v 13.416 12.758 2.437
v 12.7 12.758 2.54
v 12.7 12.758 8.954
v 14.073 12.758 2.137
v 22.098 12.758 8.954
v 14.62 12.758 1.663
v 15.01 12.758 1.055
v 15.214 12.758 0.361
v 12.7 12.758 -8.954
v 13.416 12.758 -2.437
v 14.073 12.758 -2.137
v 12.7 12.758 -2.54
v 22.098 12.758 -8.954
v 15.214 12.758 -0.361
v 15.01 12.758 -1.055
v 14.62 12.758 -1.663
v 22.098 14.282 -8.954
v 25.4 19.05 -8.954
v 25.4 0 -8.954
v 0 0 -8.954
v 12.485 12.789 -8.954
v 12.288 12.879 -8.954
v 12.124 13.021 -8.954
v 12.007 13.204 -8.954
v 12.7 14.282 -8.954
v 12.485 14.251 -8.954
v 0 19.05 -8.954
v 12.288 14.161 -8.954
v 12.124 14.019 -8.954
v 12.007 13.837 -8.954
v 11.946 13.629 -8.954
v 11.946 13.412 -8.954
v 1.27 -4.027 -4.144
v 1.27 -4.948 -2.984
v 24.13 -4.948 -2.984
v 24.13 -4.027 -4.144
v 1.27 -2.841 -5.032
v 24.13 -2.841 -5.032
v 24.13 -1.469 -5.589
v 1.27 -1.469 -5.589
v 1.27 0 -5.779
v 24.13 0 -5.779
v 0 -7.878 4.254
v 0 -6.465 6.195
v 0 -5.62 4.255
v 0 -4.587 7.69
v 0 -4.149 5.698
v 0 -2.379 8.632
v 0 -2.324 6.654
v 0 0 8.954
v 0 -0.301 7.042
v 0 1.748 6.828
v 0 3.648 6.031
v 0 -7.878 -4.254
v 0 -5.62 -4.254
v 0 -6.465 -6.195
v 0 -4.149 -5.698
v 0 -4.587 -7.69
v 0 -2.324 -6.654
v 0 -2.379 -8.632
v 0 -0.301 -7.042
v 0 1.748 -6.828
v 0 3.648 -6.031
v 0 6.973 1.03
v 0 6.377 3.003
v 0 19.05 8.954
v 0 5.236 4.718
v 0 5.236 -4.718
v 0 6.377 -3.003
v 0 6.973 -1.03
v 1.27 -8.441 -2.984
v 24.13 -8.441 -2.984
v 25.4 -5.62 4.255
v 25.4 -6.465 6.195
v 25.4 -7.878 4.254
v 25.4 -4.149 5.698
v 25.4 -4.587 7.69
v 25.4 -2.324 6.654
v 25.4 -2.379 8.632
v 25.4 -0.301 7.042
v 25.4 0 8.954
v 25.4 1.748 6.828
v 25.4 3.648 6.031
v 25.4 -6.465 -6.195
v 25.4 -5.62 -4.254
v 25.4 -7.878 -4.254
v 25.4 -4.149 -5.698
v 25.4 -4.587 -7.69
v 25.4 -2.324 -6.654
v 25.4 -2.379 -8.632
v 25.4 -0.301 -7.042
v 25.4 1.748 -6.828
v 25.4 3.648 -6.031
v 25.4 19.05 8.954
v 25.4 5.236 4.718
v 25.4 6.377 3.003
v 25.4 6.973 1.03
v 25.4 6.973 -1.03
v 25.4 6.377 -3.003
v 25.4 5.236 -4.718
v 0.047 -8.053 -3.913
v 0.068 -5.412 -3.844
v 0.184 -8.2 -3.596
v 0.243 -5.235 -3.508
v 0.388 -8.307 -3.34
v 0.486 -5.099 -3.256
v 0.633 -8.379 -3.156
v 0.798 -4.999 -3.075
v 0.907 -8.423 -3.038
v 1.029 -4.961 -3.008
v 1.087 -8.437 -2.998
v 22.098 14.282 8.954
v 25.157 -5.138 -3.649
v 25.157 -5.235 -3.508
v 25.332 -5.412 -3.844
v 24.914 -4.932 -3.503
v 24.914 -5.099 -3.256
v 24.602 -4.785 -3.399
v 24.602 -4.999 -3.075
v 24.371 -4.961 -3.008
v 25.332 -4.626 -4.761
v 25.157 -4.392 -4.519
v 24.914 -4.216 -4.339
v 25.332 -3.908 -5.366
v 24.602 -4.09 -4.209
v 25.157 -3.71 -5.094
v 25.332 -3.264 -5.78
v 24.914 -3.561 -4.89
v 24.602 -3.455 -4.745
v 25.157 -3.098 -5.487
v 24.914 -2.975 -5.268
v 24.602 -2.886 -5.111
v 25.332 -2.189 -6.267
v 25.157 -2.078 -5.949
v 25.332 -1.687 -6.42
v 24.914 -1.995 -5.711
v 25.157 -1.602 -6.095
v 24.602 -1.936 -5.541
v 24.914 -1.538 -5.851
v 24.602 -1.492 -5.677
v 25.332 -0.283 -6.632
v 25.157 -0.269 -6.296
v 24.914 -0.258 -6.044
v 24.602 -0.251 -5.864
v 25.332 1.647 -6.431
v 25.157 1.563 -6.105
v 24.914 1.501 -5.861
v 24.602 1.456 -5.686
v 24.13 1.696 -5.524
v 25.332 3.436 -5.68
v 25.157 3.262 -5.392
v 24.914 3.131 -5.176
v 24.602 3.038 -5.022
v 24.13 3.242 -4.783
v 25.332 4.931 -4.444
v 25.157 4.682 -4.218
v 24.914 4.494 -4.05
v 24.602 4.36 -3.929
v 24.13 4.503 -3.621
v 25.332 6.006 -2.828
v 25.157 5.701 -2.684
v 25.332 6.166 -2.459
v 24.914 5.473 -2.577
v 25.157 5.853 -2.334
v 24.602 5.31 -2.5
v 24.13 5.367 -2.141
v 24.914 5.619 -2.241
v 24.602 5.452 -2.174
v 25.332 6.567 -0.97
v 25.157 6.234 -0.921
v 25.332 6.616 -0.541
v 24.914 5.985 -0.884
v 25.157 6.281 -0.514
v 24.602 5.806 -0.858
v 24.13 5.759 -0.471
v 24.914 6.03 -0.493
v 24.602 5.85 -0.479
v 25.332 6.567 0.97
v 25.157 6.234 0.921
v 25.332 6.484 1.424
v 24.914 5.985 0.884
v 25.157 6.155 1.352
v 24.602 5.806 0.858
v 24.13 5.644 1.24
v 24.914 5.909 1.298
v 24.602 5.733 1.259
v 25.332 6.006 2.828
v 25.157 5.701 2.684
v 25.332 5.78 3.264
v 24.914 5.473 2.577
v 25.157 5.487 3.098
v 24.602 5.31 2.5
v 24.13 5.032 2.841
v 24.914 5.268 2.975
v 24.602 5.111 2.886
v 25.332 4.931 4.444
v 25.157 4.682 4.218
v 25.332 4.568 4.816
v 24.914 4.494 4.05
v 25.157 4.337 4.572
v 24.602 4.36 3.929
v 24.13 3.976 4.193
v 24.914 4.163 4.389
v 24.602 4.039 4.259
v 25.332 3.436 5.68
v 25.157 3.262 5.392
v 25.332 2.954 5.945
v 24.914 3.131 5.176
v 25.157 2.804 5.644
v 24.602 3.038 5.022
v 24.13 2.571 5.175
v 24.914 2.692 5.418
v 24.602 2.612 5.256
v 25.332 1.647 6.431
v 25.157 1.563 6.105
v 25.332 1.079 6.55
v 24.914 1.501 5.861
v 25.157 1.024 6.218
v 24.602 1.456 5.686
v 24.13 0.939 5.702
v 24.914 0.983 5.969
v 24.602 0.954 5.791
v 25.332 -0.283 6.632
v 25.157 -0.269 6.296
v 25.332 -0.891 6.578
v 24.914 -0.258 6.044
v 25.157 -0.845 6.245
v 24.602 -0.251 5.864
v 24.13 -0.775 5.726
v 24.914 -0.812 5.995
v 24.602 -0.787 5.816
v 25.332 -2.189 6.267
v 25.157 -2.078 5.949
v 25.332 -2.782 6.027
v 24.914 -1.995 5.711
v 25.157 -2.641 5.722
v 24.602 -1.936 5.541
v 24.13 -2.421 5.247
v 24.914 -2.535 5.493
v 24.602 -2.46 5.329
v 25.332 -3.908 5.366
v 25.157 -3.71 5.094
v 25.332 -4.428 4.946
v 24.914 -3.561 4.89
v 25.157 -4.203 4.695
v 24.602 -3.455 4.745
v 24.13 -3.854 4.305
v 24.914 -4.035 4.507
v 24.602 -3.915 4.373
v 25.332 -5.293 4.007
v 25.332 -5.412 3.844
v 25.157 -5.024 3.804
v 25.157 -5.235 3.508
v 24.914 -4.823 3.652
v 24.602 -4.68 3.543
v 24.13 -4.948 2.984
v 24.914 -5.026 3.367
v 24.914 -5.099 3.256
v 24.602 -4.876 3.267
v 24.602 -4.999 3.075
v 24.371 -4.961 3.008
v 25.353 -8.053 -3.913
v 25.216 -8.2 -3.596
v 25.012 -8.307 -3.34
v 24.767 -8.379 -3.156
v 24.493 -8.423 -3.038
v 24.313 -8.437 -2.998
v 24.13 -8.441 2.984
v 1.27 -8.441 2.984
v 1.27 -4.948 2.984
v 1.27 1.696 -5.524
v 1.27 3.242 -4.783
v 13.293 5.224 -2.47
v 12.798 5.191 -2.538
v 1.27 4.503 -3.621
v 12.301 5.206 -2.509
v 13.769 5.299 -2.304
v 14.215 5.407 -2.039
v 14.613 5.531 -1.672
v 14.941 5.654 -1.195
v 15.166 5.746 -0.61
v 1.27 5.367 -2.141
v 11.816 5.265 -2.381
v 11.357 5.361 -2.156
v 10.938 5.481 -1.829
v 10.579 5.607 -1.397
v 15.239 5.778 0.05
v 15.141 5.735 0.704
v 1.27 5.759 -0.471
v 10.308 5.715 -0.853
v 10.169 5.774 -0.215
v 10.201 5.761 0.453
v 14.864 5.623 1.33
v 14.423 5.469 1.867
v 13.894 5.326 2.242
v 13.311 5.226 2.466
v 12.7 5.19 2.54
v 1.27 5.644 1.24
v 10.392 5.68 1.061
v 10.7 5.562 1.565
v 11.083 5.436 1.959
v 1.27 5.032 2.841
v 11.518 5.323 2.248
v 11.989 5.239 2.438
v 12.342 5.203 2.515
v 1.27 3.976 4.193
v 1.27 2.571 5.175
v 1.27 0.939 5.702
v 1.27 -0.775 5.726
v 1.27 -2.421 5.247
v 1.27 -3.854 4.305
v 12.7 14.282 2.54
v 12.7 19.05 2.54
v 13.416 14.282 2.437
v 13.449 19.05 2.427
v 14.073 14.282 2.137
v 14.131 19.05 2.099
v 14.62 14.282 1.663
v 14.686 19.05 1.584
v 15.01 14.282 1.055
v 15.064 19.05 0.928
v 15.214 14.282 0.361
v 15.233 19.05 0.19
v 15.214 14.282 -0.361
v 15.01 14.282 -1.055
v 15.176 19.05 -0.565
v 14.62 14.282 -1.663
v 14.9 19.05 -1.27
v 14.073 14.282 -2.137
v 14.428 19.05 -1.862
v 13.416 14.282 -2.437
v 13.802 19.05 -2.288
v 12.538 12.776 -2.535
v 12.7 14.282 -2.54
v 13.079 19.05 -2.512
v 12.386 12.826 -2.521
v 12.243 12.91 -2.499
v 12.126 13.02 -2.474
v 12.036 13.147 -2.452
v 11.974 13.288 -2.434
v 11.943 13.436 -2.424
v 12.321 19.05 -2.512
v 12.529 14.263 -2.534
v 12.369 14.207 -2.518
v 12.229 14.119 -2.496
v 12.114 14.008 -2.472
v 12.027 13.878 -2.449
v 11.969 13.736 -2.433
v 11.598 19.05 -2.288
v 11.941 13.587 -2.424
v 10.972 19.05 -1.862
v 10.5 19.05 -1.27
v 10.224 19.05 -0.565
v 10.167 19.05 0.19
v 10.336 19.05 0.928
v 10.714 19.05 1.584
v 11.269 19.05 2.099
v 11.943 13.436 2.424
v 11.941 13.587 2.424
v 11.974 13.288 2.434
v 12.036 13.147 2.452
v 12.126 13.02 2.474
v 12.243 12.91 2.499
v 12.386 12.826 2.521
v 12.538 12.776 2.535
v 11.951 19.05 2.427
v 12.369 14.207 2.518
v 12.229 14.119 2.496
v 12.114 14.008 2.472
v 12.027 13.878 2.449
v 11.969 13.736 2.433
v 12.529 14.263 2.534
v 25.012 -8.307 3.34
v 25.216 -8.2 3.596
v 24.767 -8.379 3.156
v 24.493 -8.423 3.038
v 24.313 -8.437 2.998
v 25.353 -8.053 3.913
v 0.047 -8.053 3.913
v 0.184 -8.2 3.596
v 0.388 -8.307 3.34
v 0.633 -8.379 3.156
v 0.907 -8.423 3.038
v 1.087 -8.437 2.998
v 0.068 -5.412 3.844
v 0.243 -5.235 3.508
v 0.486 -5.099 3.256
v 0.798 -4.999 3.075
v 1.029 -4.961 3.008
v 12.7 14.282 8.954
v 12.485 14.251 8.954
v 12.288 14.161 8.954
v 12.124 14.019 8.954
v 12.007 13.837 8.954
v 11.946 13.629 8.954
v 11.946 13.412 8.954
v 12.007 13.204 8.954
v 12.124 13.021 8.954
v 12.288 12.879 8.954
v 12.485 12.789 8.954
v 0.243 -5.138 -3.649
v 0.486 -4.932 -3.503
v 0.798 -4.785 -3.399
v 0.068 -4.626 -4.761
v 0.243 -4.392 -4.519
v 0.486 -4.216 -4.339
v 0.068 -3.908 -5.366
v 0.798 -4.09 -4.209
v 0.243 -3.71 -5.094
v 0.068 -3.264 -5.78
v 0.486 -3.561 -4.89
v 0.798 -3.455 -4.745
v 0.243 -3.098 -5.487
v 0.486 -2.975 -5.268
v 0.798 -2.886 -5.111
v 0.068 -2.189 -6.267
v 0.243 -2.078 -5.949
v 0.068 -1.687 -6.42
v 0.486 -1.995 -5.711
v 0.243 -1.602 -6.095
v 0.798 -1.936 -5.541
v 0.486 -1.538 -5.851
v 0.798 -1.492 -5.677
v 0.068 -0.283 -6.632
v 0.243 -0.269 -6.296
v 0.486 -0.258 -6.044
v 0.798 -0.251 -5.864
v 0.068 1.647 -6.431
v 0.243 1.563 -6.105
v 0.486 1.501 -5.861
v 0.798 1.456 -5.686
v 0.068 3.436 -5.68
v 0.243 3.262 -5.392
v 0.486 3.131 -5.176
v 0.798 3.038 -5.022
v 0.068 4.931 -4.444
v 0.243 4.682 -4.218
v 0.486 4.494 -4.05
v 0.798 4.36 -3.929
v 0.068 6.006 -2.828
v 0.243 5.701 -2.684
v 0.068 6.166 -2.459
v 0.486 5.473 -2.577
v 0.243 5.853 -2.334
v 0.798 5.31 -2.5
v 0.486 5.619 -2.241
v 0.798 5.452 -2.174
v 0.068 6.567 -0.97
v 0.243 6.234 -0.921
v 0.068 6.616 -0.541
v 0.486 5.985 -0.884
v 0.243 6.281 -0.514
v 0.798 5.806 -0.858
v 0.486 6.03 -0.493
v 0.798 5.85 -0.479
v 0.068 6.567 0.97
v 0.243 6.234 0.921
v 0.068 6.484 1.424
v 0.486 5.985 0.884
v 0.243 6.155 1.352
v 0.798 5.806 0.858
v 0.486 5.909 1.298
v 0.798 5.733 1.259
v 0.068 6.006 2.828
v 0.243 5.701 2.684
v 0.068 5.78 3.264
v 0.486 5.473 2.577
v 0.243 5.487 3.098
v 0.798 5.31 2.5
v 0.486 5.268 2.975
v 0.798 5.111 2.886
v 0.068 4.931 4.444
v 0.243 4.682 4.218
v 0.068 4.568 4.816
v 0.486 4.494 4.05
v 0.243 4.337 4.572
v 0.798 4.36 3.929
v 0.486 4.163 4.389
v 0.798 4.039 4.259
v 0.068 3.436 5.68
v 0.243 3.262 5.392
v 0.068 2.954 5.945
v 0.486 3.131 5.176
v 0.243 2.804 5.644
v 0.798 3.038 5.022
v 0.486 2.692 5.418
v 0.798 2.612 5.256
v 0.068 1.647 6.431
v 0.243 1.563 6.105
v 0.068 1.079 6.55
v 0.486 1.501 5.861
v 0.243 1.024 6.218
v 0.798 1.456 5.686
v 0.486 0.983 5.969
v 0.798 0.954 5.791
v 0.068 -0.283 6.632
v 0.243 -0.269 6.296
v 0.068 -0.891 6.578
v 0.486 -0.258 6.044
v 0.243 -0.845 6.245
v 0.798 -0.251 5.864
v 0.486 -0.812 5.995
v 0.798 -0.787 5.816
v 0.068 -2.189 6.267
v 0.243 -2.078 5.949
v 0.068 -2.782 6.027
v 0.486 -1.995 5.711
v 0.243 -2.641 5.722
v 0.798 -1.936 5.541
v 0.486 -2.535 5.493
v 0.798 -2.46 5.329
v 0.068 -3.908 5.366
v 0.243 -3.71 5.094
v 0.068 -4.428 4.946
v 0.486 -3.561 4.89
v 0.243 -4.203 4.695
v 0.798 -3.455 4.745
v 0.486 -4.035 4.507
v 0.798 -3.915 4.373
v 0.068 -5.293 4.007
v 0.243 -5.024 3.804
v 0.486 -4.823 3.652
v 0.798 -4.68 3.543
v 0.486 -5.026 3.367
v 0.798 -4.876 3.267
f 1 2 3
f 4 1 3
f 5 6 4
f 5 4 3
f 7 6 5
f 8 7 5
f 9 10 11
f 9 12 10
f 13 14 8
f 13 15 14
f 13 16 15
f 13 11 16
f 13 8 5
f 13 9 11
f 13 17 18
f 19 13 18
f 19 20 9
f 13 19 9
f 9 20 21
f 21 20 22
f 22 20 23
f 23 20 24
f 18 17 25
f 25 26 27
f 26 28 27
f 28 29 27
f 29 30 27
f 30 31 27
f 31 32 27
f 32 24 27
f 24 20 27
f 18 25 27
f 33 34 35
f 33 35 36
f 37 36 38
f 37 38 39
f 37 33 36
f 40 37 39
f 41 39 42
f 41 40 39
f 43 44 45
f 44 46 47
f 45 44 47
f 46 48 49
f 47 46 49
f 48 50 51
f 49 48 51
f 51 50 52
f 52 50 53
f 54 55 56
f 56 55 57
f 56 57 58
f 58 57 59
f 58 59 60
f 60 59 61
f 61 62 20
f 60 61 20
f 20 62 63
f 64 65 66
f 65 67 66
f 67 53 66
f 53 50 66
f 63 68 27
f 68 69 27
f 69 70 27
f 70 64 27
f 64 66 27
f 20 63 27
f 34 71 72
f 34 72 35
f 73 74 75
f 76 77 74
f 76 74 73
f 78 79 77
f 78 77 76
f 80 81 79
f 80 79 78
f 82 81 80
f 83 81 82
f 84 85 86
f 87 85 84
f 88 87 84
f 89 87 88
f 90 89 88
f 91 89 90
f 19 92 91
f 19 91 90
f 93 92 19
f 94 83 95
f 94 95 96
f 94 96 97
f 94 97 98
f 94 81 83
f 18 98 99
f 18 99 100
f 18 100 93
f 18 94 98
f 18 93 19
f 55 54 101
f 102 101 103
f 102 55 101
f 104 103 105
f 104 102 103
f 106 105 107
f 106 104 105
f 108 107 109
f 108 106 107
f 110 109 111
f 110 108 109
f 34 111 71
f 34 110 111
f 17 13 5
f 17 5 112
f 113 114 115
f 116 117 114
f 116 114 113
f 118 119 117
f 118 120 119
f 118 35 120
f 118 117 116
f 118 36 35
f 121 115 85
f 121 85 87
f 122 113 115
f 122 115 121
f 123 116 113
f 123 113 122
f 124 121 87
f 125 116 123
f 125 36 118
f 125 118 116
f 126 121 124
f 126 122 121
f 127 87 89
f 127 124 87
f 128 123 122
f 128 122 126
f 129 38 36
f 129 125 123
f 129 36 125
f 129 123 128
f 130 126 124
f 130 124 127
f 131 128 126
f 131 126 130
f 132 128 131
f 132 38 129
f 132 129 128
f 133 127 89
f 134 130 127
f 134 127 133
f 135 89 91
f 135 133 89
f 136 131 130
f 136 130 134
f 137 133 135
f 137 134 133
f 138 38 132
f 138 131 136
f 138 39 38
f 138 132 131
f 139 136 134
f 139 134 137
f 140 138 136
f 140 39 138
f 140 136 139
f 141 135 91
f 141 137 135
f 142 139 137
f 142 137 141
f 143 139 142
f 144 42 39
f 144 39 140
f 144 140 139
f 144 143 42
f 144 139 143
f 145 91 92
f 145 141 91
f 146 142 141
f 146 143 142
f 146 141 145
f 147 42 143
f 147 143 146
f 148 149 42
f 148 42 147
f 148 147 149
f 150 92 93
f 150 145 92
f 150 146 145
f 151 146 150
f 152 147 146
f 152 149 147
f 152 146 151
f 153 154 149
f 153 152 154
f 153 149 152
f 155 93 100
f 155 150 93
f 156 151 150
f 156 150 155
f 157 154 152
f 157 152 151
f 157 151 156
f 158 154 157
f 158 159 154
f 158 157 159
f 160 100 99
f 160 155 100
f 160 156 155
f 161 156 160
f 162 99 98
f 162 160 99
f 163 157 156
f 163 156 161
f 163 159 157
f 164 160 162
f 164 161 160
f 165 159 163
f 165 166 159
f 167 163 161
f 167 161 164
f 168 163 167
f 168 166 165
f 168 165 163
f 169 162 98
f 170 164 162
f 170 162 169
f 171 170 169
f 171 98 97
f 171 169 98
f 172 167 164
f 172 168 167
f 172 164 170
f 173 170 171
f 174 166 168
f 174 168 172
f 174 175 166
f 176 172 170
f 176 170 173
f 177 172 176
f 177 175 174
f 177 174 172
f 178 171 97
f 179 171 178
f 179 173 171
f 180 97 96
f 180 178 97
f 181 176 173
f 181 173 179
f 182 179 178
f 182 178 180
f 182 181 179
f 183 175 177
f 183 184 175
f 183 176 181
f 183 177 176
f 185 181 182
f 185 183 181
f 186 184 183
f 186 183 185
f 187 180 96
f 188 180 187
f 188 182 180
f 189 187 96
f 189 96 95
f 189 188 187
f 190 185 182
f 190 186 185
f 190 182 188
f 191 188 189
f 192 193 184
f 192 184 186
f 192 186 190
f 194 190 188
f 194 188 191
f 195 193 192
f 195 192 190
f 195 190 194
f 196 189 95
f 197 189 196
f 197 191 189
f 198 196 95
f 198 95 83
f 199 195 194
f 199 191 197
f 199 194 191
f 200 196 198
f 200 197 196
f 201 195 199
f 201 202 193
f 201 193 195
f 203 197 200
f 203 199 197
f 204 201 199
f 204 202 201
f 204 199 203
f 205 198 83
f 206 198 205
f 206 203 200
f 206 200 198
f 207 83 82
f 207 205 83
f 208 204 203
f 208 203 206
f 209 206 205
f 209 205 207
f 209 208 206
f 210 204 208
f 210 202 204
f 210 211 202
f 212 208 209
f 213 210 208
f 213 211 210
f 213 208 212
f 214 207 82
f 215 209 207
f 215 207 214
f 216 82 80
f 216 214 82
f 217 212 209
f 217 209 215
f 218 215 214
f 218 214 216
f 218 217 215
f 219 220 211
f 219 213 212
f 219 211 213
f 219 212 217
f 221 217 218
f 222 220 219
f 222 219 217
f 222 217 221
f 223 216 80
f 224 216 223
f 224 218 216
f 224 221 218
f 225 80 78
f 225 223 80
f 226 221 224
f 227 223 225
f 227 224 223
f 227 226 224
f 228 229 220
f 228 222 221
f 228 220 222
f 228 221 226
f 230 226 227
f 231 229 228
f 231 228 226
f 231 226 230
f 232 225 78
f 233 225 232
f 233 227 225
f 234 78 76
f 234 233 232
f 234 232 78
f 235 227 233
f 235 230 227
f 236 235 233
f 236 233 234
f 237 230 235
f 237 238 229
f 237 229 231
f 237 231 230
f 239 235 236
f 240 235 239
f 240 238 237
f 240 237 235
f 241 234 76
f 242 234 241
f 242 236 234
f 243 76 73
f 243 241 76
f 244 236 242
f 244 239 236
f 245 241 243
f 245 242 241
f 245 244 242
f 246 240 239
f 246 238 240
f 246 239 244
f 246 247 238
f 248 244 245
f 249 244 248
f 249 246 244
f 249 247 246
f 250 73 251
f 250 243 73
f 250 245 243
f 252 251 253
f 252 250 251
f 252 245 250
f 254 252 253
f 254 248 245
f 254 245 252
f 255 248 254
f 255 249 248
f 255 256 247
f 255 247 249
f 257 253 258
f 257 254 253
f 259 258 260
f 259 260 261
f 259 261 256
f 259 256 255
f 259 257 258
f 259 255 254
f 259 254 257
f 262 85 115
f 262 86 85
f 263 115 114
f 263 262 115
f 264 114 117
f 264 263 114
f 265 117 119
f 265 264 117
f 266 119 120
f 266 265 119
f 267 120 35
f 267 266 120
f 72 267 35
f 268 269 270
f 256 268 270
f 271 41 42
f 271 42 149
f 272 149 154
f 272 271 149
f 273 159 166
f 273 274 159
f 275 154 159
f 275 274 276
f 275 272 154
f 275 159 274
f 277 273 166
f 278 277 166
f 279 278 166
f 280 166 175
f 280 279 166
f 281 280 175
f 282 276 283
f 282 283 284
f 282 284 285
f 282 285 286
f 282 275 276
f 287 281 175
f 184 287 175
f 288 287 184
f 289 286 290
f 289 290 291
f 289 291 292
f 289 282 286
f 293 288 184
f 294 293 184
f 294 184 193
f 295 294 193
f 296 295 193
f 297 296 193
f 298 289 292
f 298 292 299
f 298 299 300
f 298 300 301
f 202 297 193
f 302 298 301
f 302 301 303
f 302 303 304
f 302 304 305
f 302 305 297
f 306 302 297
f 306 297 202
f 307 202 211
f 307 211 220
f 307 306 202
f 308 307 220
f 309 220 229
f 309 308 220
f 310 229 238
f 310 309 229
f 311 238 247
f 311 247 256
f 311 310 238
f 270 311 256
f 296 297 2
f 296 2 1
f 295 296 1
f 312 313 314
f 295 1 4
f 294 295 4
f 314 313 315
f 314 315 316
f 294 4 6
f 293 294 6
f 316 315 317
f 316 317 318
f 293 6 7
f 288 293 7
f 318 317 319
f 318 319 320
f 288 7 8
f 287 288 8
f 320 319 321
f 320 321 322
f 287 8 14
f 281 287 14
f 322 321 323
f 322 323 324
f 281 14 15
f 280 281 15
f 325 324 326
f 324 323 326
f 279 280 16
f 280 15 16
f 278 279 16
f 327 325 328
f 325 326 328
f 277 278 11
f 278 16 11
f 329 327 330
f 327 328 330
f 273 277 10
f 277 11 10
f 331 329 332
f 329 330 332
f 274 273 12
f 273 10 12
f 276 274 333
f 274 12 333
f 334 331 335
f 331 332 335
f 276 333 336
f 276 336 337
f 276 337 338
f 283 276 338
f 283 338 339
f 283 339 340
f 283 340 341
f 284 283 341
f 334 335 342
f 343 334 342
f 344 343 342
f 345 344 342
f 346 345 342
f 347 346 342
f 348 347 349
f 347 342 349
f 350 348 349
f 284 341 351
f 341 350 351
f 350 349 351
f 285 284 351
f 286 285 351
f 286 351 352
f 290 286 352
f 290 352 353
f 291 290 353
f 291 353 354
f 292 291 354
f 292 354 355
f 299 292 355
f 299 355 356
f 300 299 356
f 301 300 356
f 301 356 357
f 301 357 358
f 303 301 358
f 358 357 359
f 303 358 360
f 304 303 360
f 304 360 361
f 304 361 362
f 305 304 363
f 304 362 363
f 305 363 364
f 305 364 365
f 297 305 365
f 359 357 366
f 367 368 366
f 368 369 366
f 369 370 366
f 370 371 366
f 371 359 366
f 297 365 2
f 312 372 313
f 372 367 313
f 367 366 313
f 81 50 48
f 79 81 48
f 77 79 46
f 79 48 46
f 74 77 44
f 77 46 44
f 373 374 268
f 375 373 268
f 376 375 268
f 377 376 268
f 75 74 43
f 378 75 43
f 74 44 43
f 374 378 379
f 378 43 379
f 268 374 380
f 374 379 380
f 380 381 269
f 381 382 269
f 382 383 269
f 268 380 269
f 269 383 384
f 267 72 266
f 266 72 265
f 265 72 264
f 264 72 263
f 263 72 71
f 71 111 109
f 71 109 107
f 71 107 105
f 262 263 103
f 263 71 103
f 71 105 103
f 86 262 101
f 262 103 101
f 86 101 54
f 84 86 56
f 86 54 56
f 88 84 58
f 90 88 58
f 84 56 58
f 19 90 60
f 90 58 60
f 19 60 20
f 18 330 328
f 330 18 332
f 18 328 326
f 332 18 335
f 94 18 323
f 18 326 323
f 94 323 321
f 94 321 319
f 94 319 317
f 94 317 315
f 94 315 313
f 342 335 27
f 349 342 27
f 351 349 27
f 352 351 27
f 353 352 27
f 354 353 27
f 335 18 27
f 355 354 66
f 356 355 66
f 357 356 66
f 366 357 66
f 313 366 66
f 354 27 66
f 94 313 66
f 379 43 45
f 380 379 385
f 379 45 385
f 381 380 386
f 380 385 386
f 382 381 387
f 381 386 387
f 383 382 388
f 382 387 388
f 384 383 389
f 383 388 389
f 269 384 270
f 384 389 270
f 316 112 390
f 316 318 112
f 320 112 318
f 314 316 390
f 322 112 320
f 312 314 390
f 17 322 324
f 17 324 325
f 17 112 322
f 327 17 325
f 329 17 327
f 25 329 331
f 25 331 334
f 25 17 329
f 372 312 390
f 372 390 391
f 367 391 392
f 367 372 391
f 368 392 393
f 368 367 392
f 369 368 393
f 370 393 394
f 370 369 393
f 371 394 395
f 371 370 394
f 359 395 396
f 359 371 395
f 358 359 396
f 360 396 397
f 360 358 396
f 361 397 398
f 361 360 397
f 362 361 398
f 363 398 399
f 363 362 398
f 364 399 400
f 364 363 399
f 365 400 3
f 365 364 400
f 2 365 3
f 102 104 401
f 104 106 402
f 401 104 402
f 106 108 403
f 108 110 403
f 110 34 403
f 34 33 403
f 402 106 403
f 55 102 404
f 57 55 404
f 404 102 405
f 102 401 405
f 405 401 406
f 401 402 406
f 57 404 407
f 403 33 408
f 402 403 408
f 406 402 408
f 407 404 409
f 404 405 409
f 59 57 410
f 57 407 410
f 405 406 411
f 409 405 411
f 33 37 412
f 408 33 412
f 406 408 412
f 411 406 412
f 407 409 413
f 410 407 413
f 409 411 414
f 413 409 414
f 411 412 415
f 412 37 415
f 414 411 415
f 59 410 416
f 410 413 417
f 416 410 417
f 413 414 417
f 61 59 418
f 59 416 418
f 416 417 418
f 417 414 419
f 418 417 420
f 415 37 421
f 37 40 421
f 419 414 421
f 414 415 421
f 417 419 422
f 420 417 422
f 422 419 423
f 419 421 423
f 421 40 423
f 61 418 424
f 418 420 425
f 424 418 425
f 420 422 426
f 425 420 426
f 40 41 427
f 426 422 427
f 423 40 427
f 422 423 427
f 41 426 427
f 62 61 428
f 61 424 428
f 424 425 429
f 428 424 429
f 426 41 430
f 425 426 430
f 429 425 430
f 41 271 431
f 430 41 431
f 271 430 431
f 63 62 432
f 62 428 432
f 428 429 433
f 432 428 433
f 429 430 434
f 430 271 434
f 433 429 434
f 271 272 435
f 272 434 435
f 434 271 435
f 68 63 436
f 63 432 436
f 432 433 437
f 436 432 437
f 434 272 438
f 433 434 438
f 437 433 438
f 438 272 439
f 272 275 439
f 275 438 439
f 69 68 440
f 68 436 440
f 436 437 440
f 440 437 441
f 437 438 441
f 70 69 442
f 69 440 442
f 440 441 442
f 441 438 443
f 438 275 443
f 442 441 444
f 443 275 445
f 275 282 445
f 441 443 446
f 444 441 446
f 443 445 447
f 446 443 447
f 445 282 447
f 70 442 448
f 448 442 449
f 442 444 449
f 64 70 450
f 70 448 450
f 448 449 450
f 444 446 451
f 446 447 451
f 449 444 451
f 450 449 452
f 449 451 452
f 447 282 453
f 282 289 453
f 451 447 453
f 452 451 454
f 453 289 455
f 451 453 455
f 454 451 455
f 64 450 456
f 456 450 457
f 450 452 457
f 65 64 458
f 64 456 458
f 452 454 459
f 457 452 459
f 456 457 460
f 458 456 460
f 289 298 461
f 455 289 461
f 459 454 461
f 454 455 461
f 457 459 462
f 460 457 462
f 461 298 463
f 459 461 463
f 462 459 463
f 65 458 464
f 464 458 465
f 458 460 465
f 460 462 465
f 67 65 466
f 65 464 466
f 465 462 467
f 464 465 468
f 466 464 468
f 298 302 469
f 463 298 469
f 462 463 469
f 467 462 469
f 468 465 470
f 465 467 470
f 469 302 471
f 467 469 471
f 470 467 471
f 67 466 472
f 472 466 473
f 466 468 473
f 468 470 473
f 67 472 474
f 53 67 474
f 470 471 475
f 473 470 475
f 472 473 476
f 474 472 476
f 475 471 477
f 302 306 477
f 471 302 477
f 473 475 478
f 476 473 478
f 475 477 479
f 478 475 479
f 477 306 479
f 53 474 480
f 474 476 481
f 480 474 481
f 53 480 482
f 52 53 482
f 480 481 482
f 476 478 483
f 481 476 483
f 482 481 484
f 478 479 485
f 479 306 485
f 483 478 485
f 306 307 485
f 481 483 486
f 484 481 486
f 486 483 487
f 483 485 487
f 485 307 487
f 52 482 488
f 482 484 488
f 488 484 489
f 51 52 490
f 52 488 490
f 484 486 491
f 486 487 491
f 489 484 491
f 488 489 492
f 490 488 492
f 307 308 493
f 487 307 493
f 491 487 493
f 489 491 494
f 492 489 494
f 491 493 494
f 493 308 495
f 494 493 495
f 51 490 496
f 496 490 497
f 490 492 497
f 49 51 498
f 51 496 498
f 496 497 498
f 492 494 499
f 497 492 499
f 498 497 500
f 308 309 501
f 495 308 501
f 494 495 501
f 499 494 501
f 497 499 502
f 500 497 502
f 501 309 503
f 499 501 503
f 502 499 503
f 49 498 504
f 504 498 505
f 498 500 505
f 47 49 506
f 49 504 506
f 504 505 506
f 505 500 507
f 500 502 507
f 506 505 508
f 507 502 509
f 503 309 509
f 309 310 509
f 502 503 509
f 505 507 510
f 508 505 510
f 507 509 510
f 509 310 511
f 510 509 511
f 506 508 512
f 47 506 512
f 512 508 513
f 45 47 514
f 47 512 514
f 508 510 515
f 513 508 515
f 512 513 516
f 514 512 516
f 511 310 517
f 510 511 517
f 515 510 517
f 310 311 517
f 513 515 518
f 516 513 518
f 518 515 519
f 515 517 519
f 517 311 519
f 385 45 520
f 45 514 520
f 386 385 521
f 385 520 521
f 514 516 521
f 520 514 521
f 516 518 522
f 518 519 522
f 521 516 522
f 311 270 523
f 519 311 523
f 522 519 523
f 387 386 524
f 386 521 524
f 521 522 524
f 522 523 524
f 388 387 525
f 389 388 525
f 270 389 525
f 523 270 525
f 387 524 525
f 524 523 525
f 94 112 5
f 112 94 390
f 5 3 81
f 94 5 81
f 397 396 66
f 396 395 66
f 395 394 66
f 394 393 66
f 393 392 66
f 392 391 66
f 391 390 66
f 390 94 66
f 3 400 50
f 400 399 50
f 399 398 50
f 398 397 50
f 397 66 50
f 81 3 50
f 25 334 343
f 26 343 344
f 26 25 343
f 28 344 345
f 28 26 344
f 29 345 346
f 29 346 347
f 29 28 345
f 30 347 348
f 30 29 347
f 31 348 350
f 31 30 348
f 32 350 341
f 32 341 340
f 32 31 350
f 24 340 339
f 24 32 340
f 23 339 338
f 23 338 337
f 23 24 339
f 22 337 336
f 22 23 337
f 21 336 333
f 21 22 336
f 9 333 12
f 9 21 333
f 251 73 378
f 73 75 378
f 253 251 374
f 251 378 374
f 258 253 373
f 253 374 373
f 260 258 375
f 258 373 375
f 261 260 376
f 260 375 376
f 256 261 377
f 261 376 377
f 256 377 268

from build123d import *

# Parameters (mm, degrees)
SKETCH1_R           = 5.7785
BOSS_EXTRUDE1_DEPTH = 25.4
CUT_EXTRUDE1_REACH  = 40.853
SKETCH2_R           = 2.54
SKETCH3_W           = 5.969
SKETCH3_H           = 4.005387026
CUT_EXTRUDE2_DEPTH  = 33.988295999
FILLET1_R           = 1.27
CUT_EXTRUDE4_DEPTH  = 31.887708266


with BuildPart() as part:
    # Sketch1 → Boss-Extrude1 (new body)
    with BuildSketch(Plane(origin=(0, 0, 0), x_dir=(0, 0, -1), z_dir=(1, 0, 0))):
        with BuildLine():
            Line((-8.9535, 19.05), (-8.9535, 0))
            ThreePointArc((-8.9535, 0), (0, -8.9535), (8.9535, 0))
            Line((8.9535, 0), (8.9535, 19.05))
            Line((8.9535, 19.05), (-8.9535, 19.05))
        make_face()
        Circle(SKETCH1_R, mode=Mode.SUBTRACT)
    extrude(amount=BOSS_EXTRUDE1_DEPTH)

    # Sketch2 → Cut-Extrude1 (cut, up to next)
    with BuildSketch(Plane(origin=(0, 19.05, 0), x_dir=(1, 0, 0), z_dir=(0, 1, 0)), mode=Mode.PRIVATE) as cut_extrude1_sk1:
        with Locations(Location((12.7, 0, 0), (0, 0, 270))):
            Circle(SKETCH2_R)
    cut_extrude1_tool1 = extrude(cut_extrude1_sk1.sketch, amount=-CUT_EXTRUDE1_REACH, mode=Mode.PRIVATE) & part.part
    add(cut_extrude1_tool1.solids().sort_by_distance((12.7, 19.05, 0))[0], mode=Mode.SUBTRACT)
    add(cut_extrude1_tool1.solids().sort_by_distance((12.7, 19.05, 0))[1], mode=Mode.SUBTRACT)

    # Sketch3 → Cut-Extrude2 (cut, through all)
    with BuildSketch(Plane.ZY):
        with Locations((0, -6.950806487)):
            Rectangle(SKETCH3_W, SKETCH3_H)
    extrude(amount=-CUT_EXTRUDE2_DEPTH, mode=Mode.SUBTRACT)

    # Fillet1
    fillet1_edges = [part.edges().sort_by_distance(p)[0] for p in [
        (0, 5.031748975, 2.84122588),
        (0, -6.694776864, 2.9845),
        (25.4, 5.031748975, 2.84122588),
        (0, -6.694776864, -2.9845),
        (25.4, -6.694776864, -2.9845),
        (25.4, -6.694776864, 2.9845),
    ]]
    fillet(fillet1_edges, radius=FILLET1_R)

    # Sketch6 → Cut-Extrude4 (cut, through all)
    with BuildSketch(Plane(origin=(16.4465, 0, -8.9535), x_dir=(1, 0, 0), z_dir=(0, 0, 1))):
        with BuildLine():
            Line((5.6515, 14.282208418), (-3.7465, 14.282208418))
            ThreePointArc((-3.7465, 14.282208418), (-4.5085, 13.520208418), (-3.7465, 12.758208418))
            Line((-3.7465, 12.758208418), (5.6515, 12.758208418))
            Line((5.6515, 12.758208418), (5.6515, 14.282208418))
        make_face()
    extrude(amount=CUT_EXTRUDE4_DEPTH, mode=Mode.SUBTRACT)


solid = part.part
